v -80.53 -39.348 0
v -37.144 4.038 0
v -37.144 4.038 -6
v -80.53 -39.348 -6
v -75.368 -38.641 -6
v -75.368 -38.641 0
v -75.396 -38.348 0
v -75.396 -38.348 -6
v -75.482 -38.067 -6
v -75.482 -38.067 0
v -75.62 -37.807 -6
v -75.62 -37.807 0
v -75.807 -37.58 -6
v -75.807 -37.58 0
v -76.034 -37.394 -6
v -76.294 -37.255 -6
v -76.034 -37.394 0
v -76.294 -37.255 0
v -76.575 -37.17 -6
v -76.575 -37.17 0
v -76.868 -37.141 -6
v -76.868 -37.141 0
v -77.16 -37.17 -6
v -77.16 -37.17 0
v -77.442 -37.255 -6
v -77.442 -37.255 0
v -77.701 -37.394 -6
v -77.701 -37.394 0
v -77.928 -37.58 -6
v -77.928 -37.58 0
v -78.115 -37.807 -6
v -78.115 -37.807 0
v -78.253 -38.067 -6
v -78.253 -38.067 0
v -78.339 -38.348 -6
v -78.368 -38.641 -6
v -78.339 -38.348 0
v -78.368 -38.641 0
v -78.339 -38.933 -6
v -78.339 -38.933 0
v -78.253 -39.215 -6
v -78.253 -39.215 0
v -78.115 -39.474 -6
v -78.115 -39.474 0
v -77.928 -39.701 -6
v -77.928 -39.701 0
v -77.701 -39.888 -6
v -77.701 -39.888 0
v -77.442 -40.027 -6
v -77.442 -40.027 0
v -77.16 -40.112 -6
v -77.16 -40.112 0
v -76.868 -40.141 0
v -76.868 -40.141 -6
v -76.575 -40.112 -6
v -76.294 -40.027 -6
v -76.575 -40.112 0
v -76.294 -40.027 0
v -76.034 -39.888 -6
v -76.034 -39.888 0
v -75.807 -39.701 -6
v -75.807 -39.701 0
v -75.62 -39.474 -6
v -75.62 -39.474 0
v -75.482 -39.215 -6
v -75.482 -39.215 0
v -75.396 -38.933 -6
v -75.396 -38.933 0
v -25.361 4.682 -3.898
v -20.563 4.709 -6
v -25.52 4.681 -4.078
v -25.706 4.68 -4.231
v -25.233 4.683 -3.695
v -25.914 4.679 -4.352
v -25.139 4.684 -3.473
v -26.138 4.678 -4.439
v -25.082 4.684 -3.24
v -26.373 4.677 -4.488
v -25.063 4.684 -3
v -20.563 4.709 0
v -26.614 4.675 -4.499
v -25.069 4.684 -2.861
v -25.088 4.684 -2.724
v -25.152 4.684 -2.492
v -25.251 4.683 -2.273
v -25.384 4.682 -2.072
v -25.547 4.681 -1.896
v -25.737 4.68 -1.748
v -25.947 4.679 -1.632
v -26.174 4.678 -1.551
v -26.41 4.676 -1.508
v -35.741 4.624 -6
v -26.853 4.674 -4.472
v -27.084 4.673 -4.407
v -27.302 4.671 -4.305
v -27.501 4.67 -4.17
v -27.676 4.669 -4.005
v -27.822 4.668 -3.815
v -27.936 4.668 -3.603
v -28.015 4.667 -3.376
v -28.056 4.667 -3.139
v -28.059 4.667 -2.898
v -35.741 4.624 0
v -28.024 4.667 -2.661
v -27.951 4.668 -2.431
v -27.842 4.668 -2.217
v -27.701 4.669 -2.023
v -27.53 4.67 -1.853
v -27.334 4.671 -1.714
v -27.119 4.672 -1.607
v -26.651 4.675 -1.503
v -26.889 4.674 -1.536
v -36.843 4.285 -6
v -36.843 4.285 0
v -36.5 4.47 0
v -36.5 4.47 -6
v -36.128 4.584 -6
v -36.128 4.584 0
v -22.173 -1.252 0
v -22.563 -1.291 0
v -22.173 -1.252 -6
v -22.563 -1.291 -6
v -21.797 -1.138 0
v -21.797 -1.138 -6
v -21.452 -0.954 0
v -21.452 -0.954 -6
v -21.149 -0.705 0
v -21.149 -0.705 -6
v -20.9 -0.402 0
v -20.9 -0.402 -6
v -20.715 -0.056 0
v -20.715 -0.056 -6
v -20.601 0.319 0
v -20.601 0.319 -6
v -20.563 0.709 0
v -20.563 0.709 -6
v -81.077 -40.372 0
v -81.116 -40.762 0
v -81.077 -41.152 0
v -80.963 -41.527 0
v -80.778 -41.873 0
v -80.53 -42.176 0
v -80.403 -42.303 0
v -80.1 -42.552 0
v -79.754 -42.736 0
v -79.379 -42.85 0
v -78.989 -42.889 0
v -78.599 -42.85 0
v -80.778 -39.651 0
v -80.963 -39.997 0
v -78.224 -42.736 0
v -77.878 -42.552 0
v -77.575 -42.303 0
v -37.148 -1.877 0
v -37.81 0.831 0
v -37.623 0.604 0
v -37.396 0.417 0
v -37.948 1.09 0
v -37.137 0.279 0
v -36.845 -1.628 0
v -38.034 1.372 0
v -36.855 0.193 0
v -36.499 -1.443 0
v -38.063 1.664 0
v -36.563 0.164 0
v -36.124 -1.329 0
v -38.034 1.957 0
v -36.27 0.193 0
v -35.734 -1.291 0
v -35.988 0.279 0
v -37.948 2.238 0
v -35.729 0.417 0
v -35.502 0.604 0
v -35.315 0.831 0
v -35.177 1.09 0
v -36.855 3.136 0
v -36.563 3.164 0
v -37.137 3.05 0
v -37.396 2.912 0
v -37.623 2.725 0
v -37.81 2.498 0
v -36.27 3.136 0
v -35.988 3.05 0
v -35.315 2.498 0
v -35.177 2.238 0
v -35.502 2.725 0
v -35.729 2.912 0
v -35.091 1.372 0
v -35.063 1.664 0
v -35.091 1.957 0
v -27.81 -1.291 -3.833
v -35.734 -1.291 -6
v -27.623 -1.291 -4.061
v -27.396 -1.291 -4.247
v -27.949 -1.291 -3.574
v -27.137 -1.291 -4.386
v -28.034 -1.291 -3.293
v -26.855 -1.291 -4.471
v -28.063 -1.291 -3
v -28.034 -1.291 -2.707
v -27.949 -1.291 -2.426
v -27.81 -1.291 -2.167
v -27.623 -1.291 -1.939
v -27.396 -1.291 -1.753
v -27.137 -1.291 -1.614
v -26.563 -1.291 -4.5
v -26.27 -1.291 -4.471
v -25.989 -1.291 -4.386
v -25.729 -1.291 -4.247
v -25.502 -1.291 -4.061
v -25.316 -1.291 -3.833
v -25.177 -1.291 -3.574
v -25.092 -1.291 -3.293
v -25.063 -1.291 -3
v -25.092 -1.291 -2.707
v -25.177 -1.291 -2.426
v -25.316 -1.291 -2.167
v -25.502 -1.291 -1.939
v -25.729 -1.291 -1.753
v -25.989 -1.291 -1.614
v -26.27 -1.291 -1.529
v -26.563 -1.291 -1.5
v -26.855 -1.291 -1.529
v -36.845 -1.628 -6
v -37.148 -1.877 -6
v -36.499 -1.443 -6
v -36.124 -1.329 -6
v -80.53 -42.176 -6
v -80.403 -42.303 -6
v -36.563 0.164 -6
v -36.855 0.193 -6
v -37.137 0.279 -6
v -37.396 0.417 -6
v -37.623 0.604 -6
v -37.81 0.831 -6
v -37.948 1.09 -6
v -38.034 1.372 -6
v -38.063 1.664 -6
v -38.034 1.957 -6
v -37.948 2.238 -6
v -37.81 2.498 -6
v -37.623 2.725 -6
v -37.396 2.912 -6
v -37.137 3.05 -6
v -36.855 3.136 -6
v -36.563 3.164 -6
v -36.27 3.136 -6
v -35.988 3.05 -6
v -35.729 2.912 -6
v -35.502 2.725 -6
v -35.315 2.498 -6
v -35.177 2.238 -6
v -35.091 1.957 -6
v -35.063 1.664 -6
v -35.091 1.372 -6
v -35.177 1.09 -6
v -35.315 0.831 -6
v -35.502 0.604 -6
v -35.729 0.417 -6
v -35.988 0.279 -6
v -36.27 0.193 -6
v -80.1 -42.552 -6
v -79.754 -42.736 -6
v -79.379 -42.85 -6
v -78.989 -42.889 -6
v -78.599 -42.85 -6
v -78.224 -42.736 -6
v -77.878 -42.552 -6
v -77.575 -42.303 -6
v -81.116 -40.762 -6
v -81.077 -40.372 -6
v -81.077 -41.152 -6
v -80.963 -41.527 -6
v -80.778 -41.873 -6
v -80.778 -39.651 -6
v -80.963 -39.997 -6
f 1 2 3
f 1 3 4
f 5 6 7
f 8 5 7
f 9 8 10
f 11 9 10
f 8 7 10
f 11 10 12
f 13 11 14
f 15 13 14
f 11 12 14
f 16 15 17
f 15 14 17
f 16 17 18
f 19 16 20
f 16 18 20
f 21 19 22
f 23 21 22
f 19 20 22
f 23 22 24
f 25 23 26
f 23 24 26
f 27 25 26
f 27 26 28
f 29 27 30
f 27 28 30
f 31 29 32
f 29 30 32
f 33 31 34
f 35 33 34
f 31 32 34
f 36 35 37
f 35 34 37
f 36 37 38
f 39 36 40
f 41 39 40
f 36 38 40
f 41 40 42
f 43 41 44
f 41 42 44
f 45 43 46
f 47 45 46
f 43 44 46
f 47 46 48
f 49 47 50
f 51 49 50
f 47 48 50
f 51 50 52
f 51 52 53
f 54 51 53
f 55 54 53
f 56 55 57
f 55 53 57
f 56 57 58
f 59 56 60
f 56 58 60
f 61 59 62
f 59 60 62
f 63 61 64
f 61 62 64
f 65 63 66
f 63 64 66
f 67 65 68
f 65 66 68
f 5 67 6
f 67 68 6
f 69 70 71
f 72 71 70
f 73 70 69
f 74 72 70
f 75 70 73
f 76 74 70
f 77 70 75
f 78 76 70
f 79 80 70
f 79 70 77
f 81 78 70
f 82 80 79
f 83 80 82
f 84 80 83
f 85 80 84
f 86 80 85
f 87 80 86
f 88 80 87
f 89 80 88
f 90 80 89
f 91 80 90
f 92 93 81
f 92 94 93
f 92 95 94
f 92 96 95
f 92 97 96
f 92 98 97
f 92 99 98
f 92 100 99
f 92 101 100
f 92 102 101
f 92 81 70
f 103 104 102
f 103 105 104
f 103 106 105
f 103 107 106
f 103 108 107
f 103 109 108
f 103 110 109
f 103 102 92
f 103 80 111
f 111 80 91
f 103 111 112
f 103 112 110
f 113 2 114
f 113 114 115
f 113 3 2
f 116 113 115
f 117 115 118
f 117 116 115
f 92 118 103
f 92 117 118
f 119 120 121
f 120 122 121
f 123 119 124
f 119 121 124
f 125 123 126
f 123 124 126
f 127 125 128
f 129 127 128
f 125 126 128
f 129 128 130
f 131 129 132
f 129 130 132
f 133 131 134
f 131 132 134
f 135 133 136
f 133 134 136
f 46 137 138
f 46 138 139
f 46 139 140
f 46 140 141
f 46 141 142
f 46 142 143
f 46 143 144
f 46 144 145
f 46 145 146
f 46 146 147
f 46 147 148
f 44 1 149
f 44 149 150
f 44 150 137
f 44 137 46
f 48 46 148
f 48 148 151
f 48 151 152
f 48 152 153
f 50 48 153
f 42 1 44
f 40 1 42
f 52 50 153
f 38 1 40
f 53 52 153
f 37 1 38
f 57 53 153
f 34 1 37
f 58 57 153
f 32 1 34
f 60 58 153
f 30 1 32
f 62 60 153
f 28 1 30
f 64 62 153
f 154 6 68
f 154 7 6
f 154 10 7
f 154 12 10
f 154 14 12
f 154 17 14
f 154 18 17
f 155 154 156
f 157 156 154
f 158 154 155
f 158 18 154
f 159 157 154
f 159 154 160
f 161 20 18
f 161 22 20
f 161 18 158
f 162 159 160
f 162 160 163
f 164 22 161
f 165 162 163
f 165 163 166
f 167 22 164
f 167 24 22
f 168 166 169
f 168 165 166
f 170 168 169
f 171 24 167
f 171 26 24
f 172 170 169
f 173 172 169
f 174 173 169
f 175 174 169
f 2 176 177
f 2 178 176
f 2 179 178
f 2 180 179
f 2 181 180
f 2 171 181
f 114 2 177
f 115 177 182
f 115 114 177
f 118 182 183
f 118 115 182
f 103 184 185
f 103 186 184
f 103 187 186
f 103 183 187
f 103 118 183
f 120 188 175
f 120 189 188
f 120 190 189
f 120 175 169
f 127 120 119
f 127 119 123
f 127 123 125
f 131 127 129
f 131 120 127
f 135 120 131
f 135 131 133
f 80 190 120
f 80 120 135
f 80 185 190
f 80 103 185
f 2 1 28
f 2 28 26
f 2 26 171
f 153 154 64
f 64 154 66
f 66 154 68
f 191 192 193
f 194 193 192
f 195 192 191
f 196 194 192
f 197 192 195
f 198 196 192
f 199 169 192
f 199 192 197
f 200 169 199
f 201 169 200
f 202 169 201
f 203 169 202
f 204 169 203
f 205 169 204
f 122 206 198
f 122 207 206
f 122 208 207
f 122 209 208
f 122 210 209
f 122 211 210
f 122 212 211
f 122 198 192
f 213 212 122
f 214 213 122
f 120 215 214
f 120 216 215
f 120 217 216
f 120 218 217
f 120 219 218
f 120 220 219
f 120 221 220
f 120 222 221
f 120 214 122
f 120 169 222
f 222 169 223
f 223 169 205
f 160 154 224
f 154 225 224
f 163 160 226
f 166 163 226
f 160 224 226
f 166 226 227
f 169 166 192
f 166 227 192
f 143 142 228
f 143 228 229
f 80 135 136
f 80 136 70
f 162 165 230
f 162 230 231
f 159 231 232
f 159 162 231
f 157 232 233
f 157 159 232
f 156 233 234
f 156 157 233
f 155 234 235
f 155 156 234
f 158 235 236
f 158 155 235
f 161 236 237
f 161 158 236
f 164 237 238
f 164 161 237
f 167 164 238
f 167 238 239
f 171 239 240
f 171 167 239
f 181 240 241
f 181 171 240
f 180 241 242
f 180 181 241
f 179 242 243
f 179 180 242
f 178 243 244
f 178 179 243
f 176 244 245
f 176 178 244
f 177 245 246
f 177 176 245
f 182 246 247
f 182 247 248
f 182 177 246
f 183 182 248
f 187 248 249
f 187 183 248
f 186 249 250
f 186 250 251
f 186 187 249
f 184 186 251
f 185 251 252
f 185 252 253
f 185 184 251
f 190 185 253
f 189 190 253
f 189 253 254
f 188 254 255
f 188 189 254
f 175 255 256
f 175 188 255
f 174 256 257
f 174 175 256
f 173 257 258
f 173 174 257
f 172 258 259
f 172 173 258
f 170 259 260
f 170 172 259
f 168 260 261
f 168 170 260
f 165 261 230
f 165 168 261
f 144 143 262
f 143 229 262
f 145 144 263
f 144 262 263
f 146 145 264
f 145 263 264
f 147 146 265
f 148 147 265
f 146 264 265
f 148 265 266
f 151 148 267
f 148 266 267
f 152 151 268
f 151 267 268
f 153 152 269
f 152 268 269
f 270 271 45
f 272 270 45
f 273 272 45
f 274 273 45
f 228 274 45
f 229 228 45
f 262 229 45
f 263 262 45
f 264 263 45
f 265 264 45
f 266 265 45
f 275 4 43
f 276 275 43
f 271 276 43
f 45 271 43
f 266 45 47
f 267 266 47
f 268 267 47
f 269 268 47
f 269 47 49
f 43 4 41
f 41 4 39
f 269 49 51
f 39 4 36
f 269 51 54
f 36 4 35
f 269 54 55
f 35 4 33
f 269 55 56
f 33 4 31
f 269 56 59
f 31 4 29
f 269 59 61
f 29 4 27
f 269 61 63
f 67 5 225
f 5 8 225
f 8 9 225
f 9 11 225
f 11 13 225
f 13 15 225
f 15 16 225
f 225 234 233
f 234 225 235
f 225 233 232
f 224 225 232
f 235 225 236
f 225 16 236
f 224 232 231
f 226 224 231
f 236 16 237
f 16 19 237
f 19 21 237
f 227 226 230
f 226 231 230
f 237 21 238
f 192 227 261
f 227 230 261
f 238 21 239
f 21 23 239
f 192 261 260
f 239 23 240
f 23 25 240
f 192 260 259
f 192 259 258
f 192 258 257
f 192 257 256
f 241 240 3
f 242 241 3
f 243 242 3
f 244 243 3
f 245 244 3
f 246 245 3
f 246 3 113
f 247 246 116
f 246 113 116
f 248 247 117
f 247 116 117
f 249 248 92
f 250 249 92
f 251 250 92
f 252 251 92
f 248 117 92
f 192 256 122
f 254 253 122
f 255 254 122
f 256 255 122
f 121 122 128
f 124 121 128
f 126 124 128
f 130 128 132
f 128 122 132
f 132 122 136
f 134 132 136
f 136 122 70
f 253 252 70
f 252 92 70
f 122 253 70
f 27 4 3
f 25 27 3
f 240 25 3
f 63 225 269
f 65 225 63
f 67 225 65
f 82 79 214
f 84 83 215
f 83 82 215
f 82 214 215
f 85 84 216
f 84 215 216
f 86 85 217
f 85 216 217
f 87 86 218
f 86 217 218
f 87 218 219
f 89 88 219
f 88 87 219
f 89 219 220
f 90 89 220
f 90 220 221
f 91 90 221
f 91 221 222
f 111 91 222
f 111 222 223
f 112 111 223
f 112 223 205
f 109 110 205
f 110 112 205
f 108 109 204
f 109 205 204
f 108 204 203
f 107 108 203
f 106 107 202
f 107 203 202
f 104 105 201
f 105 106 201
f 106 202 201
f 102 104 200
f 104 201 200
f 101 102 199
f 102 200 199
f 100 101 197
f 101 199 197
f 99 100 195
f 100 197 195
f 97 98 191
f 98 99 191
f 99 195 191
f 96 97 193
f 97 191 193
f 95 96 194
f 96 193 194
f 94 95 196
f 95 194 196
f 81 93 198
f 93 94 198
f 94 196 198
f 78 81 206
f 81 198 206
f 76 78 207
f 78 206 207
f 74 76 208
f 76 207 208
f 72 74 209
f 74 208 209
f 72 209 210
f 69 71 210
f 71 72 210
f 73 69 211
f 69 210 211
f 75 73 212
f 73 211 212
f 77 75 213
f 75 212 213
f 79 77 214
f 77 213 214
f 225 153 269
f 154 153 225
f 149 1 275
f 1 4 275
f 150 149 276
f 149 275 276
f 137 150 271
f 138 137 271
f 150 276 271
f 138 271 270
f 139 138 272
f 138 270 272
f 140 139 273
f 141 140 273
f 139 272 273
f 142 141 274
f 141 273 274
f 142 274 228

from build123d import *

# Parameters (mm, degrees)
F1_DEPTH = 6
F0_R     = 1.5
F2_DEPTH = 6
F3_R     = 1.5
F4_DEPTH = 12.5
F5_R     = 2


with BuildPart() as f1:
    # F0 (on Top) → F1 (new body)
    with BuildSketch(Plane.XY):
        with BuildLine():
            Line((-20.562754872, -1.2907197386), (-20.562754872, 4.7092802614))
            Line((-20.562754872, 4.7092802614), (-36.5625023842, 4.6193939634))
            Line((-36.5625023842, 4.6193939634), (-36.5625023842, 3.1643371124))
            ThreePointArc((-36.5625023842, 3.1643371124), (-35.0625023842, 1.6643371124), (-36.5625023842, 0.1643371124))
            Line((-36.5625023842, 0.1643371124), (-36.5625023842, -1.2907197386))
            Line((-36.5625023842, -1.2907197386), (-20.562754872, -1.2907197386))
        make_face()
    extrude(amount=-F1_DEPTH)

    # F0 (on Top) → F2 (join)
    with BuildSketch(Plane.XY):
        with BuildLine():
            Line((-36.5625023842, 3.1643371124), (-36.5625023842, 4.6193939634))
            Line((-36.5625023842, 4.6193939634), (-81.9439661063, -40.7620697588))
            Line((-81.9439661063, -40.7620697588), (-78.9889092554, -43.7171266098))
            Line((-78.9889092554, -43.7171266098), (-36.5625023842, -1.2907197386))
            Line((-36.5625023842, -1.2907197386), (-36.5625023842, 0.1643371124))
            ThreePointArc((-36.5625023842, 0.1643371124), (-38.0625023842, 1.6643371124), (-36.5625023842, 3.1643371124))
        make_face()
        with Locations((-76.8675889118, -38.6407494152)):
            Circle(F0_R, mode=Mode.SUBTRACT)
    extrude(amount=-F2_DEPTH)

    # F3 (on Front) → F4 (cut, symmetric)
    with BuildSketch(Plane.XZ):
        with Locations((-26.562754872, -3)):
            Circle(F3_R)
    extrude(amount=F4_DEPTH, both=True, mode=Mode.SUBTRACT)

    # F5
    f5_edges = [f1.edges().sort_by_distance(p)[0] for p in [
        (-36.562502, 4.619394, -3),
        (-20.562755, -1.29072, -3),
        (-36.562502, -1.29072, -3),
        (-78.988909, -43.717127, -3),
        (-81.943966, -40.76207, -3),
    ]]
    fillet(f5_edges, radius=F5_R)


solid = f1.part
